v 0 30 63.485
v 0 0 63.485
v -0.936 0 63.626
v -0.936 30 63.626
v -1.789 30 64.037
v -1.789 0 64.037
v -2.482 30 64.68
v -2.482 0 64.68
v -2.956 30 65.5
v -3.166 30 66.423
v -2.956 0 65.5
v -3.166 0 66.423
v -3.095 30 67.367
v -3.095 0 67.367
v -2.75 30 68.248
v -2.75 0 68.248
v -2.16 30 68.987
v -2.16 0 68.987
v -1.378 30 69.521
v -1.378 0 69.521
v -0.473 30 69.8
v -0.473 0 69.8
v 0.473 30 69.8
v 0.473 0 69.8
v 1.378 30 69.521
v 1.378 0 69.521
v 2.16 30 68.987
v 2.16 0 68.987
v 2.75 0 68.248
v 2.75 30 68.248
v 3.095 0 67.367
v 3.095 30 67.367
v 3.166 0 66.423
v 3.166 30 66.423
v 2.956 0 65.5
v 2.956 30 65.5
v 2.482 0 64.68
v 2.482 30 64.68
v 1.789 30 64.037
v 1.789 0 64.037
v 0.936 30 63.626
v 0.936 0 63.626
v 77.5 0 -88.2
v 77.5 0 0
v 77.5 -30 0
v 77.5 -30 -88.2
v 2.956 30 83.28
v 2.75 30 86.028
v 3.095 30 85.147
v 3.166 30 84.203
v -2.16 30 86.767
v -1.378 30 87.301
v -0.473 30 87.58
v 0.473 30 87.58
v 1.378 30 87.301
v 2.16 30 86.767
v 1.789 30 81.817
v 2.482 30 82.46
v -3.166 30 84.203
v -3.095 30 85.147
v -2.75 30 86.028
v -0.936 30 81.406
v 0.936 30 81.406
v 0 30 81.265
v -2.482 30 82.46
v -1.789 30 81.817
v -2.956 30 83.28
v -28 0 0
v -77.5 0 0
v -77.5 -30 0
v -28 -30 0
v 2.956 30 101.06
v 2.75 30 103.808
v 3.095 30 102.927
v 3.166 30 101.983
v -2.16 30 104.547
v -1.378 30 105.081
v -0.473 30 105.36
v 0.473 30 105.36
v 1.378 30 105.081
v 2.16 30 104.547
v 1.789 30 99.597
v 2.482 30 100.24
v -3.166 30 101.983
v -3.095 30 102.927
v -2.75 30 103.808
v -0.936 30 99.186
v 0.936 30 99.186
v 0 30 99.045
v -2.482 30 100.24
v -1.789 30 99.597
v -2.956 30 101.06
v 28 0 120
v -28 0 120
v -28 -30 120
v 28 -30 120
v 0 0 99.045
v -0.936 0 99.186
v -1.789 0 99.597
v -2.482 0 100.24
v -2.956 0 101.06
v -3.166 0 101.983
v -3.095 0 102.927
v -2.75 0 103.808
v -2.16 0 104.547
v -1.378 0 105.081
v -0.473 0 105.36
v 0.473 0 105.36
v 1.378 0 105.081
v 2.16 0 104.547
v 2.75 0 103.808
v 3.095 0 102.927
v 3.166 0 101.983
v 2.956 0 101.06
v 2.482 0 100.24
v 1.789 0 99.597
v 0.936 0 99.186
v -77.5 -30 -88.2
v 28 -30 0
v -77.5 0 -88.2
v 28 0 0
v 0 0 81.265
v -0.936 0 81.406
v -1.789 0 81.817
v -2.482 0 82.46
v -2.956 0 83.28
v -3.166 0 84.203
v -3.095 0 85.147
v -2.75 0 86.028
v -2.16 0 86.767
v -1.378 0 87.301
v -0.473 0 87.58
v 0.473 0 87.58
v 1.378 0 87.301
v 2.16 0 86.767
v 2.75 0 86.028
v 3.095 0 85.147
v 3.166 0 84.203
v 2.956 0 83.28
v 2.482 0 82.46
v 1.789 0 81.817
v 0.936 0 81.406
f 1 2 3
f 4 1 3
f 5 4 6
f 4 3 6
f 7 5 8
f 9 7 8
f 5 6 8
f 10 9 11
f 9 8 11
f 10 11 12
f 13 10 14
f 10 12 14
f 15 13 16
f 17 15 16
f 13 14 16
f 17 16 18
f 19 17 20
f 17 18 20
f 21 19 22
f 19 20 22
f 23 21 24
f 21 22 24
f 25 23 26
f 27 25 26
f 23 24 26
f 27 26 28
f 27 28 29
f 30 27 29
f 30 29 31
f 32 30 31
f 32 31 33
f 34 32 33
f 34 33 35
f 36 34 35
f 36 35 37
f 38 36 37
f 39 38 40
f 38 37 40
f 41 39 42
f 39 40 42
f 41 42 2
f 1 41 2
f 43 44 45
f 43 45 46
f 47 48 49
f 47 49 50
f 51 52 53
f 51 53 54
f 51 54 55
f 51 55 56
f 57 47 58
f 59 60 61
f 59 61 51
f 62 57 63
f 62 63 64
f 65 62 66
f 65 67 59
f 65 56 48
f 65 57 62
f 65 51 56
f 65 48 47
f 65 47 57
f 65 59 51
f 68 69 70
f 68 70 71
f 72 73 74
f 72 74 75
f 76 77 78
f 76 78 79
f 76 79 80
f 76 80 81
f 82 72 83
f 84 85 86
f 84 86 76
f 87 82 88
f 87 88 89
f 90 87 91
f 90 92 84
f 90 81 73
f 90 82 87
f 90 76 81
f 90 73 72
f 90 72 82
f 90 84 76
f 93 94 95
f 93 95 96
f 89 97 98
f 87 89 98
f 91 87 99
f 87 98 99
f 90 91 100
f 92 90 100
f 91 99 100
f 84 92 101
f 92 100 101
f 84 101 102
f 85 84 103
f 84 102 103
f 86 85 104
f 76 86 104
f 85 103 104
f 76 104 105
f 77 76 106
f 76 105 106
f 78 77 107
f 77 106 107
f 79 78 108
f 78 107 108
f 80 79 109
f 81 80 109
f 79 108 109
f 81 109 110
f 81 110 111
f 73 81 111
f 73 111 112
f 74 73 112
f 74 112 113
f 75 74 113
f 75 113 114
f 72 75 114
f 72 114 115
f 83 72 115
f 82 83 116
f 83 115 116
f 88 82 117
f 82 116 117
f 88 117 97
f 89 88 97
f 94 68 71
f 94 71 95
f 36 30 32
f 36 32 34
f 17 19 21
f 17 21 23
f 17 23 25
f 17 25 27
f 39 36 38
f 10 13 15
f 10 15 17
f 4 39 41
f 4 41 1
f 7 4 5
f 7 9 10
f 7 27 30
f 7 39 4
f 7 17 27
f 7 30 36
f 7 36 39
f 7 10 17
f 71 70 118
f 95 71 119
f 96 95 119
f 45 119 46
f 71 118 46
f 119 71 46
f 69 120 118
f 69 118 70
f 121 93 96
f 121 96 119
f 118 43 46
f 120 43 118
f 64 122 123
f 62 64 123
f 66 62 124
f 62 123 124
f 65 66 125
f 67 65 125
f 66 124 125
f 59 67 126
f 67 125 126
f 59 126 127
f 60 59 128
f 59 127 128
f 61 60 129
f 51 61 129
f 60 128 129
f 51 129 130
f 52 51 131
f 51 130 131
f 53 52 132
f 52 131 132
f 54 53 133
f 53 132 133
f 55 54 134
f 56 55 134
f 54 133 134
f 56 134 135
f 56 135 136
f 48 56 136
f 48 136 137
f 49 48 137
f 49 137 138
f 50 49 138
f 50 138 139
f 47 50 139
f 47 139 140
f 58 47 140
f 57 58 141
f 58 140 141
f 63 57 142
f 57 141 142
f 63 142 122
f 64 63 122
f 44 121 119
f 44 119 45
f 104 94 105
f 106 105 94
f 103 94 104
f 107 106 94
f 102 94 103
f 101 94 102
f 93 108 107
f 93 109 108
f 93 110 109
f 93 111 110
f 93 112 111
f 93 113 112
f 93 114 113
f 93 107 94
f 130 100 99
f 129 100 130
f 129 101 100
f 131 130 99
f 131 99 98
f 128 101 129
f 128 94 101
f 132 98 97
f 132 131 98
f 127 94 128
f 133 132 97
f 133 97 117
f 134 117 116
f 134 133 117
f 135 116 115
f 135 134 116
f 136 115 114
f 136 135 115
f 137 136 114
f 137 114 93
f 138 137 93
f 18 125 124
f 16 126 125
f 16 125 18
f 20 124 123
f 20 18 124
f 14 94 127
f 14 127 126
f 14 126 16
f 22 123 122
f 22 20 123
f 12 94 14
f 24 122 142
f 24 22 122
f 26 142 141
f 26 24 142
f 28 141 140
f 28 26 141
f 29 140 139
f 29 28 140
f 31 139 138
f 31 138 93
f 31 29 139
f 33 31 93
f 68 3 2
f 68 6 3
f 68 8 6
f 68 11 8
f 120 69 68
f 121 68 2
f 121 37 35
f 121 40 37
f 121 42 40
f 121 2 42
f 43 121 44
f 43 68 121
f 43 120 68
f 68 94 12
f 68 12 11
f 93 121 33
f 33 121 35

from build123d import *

# Parameters (mm, degrees)
BOSS_EXTRUDE1_DEPTH = 30
SKETCH2_R           = 3.175
BOSS_EXTRUDE2_DEPTH = 30


with BuildPart() as part:
    # Sketch1 → Boss-Extrude1 (new body)
    with BuildSketch(Plane(origin=(0, 0, 0), x_dir=(1, 0, 0), z_dir=(0, 1, 0))):
        Polygon((28, 0), (77.5, 0), (77.5, 88.2), (-77.5, 88.2), (-77.5, 0), (-28, 0), (-28, -120), (28, -120), align=None)
    extrude(amount=-BOSS_EXTRUDE1_DEPTH)

    # Sketch2 → Boss-Extrude2 (add)
    with BuildSketch(Plane(origin=(0, 0, 0), x_dir=(1, 0, 0), z_dir=(0, 1, 0))):
        with Locations(Location((0, -84.44, 0), (0, 0, 90))):
            Circle(SKETCH2_R)
        with Locations(Location((0, -66.66, 0), (0, 0, 90))):
            Circle(SKETCH2_R)
        with Locations(Location((0, -102.22, 0), (0, 0, 90))):
            Circle(SKETCH2_R)
    extrude(amount=BOSS_EXTRUDE2_DEPTH)


solid = part.part
